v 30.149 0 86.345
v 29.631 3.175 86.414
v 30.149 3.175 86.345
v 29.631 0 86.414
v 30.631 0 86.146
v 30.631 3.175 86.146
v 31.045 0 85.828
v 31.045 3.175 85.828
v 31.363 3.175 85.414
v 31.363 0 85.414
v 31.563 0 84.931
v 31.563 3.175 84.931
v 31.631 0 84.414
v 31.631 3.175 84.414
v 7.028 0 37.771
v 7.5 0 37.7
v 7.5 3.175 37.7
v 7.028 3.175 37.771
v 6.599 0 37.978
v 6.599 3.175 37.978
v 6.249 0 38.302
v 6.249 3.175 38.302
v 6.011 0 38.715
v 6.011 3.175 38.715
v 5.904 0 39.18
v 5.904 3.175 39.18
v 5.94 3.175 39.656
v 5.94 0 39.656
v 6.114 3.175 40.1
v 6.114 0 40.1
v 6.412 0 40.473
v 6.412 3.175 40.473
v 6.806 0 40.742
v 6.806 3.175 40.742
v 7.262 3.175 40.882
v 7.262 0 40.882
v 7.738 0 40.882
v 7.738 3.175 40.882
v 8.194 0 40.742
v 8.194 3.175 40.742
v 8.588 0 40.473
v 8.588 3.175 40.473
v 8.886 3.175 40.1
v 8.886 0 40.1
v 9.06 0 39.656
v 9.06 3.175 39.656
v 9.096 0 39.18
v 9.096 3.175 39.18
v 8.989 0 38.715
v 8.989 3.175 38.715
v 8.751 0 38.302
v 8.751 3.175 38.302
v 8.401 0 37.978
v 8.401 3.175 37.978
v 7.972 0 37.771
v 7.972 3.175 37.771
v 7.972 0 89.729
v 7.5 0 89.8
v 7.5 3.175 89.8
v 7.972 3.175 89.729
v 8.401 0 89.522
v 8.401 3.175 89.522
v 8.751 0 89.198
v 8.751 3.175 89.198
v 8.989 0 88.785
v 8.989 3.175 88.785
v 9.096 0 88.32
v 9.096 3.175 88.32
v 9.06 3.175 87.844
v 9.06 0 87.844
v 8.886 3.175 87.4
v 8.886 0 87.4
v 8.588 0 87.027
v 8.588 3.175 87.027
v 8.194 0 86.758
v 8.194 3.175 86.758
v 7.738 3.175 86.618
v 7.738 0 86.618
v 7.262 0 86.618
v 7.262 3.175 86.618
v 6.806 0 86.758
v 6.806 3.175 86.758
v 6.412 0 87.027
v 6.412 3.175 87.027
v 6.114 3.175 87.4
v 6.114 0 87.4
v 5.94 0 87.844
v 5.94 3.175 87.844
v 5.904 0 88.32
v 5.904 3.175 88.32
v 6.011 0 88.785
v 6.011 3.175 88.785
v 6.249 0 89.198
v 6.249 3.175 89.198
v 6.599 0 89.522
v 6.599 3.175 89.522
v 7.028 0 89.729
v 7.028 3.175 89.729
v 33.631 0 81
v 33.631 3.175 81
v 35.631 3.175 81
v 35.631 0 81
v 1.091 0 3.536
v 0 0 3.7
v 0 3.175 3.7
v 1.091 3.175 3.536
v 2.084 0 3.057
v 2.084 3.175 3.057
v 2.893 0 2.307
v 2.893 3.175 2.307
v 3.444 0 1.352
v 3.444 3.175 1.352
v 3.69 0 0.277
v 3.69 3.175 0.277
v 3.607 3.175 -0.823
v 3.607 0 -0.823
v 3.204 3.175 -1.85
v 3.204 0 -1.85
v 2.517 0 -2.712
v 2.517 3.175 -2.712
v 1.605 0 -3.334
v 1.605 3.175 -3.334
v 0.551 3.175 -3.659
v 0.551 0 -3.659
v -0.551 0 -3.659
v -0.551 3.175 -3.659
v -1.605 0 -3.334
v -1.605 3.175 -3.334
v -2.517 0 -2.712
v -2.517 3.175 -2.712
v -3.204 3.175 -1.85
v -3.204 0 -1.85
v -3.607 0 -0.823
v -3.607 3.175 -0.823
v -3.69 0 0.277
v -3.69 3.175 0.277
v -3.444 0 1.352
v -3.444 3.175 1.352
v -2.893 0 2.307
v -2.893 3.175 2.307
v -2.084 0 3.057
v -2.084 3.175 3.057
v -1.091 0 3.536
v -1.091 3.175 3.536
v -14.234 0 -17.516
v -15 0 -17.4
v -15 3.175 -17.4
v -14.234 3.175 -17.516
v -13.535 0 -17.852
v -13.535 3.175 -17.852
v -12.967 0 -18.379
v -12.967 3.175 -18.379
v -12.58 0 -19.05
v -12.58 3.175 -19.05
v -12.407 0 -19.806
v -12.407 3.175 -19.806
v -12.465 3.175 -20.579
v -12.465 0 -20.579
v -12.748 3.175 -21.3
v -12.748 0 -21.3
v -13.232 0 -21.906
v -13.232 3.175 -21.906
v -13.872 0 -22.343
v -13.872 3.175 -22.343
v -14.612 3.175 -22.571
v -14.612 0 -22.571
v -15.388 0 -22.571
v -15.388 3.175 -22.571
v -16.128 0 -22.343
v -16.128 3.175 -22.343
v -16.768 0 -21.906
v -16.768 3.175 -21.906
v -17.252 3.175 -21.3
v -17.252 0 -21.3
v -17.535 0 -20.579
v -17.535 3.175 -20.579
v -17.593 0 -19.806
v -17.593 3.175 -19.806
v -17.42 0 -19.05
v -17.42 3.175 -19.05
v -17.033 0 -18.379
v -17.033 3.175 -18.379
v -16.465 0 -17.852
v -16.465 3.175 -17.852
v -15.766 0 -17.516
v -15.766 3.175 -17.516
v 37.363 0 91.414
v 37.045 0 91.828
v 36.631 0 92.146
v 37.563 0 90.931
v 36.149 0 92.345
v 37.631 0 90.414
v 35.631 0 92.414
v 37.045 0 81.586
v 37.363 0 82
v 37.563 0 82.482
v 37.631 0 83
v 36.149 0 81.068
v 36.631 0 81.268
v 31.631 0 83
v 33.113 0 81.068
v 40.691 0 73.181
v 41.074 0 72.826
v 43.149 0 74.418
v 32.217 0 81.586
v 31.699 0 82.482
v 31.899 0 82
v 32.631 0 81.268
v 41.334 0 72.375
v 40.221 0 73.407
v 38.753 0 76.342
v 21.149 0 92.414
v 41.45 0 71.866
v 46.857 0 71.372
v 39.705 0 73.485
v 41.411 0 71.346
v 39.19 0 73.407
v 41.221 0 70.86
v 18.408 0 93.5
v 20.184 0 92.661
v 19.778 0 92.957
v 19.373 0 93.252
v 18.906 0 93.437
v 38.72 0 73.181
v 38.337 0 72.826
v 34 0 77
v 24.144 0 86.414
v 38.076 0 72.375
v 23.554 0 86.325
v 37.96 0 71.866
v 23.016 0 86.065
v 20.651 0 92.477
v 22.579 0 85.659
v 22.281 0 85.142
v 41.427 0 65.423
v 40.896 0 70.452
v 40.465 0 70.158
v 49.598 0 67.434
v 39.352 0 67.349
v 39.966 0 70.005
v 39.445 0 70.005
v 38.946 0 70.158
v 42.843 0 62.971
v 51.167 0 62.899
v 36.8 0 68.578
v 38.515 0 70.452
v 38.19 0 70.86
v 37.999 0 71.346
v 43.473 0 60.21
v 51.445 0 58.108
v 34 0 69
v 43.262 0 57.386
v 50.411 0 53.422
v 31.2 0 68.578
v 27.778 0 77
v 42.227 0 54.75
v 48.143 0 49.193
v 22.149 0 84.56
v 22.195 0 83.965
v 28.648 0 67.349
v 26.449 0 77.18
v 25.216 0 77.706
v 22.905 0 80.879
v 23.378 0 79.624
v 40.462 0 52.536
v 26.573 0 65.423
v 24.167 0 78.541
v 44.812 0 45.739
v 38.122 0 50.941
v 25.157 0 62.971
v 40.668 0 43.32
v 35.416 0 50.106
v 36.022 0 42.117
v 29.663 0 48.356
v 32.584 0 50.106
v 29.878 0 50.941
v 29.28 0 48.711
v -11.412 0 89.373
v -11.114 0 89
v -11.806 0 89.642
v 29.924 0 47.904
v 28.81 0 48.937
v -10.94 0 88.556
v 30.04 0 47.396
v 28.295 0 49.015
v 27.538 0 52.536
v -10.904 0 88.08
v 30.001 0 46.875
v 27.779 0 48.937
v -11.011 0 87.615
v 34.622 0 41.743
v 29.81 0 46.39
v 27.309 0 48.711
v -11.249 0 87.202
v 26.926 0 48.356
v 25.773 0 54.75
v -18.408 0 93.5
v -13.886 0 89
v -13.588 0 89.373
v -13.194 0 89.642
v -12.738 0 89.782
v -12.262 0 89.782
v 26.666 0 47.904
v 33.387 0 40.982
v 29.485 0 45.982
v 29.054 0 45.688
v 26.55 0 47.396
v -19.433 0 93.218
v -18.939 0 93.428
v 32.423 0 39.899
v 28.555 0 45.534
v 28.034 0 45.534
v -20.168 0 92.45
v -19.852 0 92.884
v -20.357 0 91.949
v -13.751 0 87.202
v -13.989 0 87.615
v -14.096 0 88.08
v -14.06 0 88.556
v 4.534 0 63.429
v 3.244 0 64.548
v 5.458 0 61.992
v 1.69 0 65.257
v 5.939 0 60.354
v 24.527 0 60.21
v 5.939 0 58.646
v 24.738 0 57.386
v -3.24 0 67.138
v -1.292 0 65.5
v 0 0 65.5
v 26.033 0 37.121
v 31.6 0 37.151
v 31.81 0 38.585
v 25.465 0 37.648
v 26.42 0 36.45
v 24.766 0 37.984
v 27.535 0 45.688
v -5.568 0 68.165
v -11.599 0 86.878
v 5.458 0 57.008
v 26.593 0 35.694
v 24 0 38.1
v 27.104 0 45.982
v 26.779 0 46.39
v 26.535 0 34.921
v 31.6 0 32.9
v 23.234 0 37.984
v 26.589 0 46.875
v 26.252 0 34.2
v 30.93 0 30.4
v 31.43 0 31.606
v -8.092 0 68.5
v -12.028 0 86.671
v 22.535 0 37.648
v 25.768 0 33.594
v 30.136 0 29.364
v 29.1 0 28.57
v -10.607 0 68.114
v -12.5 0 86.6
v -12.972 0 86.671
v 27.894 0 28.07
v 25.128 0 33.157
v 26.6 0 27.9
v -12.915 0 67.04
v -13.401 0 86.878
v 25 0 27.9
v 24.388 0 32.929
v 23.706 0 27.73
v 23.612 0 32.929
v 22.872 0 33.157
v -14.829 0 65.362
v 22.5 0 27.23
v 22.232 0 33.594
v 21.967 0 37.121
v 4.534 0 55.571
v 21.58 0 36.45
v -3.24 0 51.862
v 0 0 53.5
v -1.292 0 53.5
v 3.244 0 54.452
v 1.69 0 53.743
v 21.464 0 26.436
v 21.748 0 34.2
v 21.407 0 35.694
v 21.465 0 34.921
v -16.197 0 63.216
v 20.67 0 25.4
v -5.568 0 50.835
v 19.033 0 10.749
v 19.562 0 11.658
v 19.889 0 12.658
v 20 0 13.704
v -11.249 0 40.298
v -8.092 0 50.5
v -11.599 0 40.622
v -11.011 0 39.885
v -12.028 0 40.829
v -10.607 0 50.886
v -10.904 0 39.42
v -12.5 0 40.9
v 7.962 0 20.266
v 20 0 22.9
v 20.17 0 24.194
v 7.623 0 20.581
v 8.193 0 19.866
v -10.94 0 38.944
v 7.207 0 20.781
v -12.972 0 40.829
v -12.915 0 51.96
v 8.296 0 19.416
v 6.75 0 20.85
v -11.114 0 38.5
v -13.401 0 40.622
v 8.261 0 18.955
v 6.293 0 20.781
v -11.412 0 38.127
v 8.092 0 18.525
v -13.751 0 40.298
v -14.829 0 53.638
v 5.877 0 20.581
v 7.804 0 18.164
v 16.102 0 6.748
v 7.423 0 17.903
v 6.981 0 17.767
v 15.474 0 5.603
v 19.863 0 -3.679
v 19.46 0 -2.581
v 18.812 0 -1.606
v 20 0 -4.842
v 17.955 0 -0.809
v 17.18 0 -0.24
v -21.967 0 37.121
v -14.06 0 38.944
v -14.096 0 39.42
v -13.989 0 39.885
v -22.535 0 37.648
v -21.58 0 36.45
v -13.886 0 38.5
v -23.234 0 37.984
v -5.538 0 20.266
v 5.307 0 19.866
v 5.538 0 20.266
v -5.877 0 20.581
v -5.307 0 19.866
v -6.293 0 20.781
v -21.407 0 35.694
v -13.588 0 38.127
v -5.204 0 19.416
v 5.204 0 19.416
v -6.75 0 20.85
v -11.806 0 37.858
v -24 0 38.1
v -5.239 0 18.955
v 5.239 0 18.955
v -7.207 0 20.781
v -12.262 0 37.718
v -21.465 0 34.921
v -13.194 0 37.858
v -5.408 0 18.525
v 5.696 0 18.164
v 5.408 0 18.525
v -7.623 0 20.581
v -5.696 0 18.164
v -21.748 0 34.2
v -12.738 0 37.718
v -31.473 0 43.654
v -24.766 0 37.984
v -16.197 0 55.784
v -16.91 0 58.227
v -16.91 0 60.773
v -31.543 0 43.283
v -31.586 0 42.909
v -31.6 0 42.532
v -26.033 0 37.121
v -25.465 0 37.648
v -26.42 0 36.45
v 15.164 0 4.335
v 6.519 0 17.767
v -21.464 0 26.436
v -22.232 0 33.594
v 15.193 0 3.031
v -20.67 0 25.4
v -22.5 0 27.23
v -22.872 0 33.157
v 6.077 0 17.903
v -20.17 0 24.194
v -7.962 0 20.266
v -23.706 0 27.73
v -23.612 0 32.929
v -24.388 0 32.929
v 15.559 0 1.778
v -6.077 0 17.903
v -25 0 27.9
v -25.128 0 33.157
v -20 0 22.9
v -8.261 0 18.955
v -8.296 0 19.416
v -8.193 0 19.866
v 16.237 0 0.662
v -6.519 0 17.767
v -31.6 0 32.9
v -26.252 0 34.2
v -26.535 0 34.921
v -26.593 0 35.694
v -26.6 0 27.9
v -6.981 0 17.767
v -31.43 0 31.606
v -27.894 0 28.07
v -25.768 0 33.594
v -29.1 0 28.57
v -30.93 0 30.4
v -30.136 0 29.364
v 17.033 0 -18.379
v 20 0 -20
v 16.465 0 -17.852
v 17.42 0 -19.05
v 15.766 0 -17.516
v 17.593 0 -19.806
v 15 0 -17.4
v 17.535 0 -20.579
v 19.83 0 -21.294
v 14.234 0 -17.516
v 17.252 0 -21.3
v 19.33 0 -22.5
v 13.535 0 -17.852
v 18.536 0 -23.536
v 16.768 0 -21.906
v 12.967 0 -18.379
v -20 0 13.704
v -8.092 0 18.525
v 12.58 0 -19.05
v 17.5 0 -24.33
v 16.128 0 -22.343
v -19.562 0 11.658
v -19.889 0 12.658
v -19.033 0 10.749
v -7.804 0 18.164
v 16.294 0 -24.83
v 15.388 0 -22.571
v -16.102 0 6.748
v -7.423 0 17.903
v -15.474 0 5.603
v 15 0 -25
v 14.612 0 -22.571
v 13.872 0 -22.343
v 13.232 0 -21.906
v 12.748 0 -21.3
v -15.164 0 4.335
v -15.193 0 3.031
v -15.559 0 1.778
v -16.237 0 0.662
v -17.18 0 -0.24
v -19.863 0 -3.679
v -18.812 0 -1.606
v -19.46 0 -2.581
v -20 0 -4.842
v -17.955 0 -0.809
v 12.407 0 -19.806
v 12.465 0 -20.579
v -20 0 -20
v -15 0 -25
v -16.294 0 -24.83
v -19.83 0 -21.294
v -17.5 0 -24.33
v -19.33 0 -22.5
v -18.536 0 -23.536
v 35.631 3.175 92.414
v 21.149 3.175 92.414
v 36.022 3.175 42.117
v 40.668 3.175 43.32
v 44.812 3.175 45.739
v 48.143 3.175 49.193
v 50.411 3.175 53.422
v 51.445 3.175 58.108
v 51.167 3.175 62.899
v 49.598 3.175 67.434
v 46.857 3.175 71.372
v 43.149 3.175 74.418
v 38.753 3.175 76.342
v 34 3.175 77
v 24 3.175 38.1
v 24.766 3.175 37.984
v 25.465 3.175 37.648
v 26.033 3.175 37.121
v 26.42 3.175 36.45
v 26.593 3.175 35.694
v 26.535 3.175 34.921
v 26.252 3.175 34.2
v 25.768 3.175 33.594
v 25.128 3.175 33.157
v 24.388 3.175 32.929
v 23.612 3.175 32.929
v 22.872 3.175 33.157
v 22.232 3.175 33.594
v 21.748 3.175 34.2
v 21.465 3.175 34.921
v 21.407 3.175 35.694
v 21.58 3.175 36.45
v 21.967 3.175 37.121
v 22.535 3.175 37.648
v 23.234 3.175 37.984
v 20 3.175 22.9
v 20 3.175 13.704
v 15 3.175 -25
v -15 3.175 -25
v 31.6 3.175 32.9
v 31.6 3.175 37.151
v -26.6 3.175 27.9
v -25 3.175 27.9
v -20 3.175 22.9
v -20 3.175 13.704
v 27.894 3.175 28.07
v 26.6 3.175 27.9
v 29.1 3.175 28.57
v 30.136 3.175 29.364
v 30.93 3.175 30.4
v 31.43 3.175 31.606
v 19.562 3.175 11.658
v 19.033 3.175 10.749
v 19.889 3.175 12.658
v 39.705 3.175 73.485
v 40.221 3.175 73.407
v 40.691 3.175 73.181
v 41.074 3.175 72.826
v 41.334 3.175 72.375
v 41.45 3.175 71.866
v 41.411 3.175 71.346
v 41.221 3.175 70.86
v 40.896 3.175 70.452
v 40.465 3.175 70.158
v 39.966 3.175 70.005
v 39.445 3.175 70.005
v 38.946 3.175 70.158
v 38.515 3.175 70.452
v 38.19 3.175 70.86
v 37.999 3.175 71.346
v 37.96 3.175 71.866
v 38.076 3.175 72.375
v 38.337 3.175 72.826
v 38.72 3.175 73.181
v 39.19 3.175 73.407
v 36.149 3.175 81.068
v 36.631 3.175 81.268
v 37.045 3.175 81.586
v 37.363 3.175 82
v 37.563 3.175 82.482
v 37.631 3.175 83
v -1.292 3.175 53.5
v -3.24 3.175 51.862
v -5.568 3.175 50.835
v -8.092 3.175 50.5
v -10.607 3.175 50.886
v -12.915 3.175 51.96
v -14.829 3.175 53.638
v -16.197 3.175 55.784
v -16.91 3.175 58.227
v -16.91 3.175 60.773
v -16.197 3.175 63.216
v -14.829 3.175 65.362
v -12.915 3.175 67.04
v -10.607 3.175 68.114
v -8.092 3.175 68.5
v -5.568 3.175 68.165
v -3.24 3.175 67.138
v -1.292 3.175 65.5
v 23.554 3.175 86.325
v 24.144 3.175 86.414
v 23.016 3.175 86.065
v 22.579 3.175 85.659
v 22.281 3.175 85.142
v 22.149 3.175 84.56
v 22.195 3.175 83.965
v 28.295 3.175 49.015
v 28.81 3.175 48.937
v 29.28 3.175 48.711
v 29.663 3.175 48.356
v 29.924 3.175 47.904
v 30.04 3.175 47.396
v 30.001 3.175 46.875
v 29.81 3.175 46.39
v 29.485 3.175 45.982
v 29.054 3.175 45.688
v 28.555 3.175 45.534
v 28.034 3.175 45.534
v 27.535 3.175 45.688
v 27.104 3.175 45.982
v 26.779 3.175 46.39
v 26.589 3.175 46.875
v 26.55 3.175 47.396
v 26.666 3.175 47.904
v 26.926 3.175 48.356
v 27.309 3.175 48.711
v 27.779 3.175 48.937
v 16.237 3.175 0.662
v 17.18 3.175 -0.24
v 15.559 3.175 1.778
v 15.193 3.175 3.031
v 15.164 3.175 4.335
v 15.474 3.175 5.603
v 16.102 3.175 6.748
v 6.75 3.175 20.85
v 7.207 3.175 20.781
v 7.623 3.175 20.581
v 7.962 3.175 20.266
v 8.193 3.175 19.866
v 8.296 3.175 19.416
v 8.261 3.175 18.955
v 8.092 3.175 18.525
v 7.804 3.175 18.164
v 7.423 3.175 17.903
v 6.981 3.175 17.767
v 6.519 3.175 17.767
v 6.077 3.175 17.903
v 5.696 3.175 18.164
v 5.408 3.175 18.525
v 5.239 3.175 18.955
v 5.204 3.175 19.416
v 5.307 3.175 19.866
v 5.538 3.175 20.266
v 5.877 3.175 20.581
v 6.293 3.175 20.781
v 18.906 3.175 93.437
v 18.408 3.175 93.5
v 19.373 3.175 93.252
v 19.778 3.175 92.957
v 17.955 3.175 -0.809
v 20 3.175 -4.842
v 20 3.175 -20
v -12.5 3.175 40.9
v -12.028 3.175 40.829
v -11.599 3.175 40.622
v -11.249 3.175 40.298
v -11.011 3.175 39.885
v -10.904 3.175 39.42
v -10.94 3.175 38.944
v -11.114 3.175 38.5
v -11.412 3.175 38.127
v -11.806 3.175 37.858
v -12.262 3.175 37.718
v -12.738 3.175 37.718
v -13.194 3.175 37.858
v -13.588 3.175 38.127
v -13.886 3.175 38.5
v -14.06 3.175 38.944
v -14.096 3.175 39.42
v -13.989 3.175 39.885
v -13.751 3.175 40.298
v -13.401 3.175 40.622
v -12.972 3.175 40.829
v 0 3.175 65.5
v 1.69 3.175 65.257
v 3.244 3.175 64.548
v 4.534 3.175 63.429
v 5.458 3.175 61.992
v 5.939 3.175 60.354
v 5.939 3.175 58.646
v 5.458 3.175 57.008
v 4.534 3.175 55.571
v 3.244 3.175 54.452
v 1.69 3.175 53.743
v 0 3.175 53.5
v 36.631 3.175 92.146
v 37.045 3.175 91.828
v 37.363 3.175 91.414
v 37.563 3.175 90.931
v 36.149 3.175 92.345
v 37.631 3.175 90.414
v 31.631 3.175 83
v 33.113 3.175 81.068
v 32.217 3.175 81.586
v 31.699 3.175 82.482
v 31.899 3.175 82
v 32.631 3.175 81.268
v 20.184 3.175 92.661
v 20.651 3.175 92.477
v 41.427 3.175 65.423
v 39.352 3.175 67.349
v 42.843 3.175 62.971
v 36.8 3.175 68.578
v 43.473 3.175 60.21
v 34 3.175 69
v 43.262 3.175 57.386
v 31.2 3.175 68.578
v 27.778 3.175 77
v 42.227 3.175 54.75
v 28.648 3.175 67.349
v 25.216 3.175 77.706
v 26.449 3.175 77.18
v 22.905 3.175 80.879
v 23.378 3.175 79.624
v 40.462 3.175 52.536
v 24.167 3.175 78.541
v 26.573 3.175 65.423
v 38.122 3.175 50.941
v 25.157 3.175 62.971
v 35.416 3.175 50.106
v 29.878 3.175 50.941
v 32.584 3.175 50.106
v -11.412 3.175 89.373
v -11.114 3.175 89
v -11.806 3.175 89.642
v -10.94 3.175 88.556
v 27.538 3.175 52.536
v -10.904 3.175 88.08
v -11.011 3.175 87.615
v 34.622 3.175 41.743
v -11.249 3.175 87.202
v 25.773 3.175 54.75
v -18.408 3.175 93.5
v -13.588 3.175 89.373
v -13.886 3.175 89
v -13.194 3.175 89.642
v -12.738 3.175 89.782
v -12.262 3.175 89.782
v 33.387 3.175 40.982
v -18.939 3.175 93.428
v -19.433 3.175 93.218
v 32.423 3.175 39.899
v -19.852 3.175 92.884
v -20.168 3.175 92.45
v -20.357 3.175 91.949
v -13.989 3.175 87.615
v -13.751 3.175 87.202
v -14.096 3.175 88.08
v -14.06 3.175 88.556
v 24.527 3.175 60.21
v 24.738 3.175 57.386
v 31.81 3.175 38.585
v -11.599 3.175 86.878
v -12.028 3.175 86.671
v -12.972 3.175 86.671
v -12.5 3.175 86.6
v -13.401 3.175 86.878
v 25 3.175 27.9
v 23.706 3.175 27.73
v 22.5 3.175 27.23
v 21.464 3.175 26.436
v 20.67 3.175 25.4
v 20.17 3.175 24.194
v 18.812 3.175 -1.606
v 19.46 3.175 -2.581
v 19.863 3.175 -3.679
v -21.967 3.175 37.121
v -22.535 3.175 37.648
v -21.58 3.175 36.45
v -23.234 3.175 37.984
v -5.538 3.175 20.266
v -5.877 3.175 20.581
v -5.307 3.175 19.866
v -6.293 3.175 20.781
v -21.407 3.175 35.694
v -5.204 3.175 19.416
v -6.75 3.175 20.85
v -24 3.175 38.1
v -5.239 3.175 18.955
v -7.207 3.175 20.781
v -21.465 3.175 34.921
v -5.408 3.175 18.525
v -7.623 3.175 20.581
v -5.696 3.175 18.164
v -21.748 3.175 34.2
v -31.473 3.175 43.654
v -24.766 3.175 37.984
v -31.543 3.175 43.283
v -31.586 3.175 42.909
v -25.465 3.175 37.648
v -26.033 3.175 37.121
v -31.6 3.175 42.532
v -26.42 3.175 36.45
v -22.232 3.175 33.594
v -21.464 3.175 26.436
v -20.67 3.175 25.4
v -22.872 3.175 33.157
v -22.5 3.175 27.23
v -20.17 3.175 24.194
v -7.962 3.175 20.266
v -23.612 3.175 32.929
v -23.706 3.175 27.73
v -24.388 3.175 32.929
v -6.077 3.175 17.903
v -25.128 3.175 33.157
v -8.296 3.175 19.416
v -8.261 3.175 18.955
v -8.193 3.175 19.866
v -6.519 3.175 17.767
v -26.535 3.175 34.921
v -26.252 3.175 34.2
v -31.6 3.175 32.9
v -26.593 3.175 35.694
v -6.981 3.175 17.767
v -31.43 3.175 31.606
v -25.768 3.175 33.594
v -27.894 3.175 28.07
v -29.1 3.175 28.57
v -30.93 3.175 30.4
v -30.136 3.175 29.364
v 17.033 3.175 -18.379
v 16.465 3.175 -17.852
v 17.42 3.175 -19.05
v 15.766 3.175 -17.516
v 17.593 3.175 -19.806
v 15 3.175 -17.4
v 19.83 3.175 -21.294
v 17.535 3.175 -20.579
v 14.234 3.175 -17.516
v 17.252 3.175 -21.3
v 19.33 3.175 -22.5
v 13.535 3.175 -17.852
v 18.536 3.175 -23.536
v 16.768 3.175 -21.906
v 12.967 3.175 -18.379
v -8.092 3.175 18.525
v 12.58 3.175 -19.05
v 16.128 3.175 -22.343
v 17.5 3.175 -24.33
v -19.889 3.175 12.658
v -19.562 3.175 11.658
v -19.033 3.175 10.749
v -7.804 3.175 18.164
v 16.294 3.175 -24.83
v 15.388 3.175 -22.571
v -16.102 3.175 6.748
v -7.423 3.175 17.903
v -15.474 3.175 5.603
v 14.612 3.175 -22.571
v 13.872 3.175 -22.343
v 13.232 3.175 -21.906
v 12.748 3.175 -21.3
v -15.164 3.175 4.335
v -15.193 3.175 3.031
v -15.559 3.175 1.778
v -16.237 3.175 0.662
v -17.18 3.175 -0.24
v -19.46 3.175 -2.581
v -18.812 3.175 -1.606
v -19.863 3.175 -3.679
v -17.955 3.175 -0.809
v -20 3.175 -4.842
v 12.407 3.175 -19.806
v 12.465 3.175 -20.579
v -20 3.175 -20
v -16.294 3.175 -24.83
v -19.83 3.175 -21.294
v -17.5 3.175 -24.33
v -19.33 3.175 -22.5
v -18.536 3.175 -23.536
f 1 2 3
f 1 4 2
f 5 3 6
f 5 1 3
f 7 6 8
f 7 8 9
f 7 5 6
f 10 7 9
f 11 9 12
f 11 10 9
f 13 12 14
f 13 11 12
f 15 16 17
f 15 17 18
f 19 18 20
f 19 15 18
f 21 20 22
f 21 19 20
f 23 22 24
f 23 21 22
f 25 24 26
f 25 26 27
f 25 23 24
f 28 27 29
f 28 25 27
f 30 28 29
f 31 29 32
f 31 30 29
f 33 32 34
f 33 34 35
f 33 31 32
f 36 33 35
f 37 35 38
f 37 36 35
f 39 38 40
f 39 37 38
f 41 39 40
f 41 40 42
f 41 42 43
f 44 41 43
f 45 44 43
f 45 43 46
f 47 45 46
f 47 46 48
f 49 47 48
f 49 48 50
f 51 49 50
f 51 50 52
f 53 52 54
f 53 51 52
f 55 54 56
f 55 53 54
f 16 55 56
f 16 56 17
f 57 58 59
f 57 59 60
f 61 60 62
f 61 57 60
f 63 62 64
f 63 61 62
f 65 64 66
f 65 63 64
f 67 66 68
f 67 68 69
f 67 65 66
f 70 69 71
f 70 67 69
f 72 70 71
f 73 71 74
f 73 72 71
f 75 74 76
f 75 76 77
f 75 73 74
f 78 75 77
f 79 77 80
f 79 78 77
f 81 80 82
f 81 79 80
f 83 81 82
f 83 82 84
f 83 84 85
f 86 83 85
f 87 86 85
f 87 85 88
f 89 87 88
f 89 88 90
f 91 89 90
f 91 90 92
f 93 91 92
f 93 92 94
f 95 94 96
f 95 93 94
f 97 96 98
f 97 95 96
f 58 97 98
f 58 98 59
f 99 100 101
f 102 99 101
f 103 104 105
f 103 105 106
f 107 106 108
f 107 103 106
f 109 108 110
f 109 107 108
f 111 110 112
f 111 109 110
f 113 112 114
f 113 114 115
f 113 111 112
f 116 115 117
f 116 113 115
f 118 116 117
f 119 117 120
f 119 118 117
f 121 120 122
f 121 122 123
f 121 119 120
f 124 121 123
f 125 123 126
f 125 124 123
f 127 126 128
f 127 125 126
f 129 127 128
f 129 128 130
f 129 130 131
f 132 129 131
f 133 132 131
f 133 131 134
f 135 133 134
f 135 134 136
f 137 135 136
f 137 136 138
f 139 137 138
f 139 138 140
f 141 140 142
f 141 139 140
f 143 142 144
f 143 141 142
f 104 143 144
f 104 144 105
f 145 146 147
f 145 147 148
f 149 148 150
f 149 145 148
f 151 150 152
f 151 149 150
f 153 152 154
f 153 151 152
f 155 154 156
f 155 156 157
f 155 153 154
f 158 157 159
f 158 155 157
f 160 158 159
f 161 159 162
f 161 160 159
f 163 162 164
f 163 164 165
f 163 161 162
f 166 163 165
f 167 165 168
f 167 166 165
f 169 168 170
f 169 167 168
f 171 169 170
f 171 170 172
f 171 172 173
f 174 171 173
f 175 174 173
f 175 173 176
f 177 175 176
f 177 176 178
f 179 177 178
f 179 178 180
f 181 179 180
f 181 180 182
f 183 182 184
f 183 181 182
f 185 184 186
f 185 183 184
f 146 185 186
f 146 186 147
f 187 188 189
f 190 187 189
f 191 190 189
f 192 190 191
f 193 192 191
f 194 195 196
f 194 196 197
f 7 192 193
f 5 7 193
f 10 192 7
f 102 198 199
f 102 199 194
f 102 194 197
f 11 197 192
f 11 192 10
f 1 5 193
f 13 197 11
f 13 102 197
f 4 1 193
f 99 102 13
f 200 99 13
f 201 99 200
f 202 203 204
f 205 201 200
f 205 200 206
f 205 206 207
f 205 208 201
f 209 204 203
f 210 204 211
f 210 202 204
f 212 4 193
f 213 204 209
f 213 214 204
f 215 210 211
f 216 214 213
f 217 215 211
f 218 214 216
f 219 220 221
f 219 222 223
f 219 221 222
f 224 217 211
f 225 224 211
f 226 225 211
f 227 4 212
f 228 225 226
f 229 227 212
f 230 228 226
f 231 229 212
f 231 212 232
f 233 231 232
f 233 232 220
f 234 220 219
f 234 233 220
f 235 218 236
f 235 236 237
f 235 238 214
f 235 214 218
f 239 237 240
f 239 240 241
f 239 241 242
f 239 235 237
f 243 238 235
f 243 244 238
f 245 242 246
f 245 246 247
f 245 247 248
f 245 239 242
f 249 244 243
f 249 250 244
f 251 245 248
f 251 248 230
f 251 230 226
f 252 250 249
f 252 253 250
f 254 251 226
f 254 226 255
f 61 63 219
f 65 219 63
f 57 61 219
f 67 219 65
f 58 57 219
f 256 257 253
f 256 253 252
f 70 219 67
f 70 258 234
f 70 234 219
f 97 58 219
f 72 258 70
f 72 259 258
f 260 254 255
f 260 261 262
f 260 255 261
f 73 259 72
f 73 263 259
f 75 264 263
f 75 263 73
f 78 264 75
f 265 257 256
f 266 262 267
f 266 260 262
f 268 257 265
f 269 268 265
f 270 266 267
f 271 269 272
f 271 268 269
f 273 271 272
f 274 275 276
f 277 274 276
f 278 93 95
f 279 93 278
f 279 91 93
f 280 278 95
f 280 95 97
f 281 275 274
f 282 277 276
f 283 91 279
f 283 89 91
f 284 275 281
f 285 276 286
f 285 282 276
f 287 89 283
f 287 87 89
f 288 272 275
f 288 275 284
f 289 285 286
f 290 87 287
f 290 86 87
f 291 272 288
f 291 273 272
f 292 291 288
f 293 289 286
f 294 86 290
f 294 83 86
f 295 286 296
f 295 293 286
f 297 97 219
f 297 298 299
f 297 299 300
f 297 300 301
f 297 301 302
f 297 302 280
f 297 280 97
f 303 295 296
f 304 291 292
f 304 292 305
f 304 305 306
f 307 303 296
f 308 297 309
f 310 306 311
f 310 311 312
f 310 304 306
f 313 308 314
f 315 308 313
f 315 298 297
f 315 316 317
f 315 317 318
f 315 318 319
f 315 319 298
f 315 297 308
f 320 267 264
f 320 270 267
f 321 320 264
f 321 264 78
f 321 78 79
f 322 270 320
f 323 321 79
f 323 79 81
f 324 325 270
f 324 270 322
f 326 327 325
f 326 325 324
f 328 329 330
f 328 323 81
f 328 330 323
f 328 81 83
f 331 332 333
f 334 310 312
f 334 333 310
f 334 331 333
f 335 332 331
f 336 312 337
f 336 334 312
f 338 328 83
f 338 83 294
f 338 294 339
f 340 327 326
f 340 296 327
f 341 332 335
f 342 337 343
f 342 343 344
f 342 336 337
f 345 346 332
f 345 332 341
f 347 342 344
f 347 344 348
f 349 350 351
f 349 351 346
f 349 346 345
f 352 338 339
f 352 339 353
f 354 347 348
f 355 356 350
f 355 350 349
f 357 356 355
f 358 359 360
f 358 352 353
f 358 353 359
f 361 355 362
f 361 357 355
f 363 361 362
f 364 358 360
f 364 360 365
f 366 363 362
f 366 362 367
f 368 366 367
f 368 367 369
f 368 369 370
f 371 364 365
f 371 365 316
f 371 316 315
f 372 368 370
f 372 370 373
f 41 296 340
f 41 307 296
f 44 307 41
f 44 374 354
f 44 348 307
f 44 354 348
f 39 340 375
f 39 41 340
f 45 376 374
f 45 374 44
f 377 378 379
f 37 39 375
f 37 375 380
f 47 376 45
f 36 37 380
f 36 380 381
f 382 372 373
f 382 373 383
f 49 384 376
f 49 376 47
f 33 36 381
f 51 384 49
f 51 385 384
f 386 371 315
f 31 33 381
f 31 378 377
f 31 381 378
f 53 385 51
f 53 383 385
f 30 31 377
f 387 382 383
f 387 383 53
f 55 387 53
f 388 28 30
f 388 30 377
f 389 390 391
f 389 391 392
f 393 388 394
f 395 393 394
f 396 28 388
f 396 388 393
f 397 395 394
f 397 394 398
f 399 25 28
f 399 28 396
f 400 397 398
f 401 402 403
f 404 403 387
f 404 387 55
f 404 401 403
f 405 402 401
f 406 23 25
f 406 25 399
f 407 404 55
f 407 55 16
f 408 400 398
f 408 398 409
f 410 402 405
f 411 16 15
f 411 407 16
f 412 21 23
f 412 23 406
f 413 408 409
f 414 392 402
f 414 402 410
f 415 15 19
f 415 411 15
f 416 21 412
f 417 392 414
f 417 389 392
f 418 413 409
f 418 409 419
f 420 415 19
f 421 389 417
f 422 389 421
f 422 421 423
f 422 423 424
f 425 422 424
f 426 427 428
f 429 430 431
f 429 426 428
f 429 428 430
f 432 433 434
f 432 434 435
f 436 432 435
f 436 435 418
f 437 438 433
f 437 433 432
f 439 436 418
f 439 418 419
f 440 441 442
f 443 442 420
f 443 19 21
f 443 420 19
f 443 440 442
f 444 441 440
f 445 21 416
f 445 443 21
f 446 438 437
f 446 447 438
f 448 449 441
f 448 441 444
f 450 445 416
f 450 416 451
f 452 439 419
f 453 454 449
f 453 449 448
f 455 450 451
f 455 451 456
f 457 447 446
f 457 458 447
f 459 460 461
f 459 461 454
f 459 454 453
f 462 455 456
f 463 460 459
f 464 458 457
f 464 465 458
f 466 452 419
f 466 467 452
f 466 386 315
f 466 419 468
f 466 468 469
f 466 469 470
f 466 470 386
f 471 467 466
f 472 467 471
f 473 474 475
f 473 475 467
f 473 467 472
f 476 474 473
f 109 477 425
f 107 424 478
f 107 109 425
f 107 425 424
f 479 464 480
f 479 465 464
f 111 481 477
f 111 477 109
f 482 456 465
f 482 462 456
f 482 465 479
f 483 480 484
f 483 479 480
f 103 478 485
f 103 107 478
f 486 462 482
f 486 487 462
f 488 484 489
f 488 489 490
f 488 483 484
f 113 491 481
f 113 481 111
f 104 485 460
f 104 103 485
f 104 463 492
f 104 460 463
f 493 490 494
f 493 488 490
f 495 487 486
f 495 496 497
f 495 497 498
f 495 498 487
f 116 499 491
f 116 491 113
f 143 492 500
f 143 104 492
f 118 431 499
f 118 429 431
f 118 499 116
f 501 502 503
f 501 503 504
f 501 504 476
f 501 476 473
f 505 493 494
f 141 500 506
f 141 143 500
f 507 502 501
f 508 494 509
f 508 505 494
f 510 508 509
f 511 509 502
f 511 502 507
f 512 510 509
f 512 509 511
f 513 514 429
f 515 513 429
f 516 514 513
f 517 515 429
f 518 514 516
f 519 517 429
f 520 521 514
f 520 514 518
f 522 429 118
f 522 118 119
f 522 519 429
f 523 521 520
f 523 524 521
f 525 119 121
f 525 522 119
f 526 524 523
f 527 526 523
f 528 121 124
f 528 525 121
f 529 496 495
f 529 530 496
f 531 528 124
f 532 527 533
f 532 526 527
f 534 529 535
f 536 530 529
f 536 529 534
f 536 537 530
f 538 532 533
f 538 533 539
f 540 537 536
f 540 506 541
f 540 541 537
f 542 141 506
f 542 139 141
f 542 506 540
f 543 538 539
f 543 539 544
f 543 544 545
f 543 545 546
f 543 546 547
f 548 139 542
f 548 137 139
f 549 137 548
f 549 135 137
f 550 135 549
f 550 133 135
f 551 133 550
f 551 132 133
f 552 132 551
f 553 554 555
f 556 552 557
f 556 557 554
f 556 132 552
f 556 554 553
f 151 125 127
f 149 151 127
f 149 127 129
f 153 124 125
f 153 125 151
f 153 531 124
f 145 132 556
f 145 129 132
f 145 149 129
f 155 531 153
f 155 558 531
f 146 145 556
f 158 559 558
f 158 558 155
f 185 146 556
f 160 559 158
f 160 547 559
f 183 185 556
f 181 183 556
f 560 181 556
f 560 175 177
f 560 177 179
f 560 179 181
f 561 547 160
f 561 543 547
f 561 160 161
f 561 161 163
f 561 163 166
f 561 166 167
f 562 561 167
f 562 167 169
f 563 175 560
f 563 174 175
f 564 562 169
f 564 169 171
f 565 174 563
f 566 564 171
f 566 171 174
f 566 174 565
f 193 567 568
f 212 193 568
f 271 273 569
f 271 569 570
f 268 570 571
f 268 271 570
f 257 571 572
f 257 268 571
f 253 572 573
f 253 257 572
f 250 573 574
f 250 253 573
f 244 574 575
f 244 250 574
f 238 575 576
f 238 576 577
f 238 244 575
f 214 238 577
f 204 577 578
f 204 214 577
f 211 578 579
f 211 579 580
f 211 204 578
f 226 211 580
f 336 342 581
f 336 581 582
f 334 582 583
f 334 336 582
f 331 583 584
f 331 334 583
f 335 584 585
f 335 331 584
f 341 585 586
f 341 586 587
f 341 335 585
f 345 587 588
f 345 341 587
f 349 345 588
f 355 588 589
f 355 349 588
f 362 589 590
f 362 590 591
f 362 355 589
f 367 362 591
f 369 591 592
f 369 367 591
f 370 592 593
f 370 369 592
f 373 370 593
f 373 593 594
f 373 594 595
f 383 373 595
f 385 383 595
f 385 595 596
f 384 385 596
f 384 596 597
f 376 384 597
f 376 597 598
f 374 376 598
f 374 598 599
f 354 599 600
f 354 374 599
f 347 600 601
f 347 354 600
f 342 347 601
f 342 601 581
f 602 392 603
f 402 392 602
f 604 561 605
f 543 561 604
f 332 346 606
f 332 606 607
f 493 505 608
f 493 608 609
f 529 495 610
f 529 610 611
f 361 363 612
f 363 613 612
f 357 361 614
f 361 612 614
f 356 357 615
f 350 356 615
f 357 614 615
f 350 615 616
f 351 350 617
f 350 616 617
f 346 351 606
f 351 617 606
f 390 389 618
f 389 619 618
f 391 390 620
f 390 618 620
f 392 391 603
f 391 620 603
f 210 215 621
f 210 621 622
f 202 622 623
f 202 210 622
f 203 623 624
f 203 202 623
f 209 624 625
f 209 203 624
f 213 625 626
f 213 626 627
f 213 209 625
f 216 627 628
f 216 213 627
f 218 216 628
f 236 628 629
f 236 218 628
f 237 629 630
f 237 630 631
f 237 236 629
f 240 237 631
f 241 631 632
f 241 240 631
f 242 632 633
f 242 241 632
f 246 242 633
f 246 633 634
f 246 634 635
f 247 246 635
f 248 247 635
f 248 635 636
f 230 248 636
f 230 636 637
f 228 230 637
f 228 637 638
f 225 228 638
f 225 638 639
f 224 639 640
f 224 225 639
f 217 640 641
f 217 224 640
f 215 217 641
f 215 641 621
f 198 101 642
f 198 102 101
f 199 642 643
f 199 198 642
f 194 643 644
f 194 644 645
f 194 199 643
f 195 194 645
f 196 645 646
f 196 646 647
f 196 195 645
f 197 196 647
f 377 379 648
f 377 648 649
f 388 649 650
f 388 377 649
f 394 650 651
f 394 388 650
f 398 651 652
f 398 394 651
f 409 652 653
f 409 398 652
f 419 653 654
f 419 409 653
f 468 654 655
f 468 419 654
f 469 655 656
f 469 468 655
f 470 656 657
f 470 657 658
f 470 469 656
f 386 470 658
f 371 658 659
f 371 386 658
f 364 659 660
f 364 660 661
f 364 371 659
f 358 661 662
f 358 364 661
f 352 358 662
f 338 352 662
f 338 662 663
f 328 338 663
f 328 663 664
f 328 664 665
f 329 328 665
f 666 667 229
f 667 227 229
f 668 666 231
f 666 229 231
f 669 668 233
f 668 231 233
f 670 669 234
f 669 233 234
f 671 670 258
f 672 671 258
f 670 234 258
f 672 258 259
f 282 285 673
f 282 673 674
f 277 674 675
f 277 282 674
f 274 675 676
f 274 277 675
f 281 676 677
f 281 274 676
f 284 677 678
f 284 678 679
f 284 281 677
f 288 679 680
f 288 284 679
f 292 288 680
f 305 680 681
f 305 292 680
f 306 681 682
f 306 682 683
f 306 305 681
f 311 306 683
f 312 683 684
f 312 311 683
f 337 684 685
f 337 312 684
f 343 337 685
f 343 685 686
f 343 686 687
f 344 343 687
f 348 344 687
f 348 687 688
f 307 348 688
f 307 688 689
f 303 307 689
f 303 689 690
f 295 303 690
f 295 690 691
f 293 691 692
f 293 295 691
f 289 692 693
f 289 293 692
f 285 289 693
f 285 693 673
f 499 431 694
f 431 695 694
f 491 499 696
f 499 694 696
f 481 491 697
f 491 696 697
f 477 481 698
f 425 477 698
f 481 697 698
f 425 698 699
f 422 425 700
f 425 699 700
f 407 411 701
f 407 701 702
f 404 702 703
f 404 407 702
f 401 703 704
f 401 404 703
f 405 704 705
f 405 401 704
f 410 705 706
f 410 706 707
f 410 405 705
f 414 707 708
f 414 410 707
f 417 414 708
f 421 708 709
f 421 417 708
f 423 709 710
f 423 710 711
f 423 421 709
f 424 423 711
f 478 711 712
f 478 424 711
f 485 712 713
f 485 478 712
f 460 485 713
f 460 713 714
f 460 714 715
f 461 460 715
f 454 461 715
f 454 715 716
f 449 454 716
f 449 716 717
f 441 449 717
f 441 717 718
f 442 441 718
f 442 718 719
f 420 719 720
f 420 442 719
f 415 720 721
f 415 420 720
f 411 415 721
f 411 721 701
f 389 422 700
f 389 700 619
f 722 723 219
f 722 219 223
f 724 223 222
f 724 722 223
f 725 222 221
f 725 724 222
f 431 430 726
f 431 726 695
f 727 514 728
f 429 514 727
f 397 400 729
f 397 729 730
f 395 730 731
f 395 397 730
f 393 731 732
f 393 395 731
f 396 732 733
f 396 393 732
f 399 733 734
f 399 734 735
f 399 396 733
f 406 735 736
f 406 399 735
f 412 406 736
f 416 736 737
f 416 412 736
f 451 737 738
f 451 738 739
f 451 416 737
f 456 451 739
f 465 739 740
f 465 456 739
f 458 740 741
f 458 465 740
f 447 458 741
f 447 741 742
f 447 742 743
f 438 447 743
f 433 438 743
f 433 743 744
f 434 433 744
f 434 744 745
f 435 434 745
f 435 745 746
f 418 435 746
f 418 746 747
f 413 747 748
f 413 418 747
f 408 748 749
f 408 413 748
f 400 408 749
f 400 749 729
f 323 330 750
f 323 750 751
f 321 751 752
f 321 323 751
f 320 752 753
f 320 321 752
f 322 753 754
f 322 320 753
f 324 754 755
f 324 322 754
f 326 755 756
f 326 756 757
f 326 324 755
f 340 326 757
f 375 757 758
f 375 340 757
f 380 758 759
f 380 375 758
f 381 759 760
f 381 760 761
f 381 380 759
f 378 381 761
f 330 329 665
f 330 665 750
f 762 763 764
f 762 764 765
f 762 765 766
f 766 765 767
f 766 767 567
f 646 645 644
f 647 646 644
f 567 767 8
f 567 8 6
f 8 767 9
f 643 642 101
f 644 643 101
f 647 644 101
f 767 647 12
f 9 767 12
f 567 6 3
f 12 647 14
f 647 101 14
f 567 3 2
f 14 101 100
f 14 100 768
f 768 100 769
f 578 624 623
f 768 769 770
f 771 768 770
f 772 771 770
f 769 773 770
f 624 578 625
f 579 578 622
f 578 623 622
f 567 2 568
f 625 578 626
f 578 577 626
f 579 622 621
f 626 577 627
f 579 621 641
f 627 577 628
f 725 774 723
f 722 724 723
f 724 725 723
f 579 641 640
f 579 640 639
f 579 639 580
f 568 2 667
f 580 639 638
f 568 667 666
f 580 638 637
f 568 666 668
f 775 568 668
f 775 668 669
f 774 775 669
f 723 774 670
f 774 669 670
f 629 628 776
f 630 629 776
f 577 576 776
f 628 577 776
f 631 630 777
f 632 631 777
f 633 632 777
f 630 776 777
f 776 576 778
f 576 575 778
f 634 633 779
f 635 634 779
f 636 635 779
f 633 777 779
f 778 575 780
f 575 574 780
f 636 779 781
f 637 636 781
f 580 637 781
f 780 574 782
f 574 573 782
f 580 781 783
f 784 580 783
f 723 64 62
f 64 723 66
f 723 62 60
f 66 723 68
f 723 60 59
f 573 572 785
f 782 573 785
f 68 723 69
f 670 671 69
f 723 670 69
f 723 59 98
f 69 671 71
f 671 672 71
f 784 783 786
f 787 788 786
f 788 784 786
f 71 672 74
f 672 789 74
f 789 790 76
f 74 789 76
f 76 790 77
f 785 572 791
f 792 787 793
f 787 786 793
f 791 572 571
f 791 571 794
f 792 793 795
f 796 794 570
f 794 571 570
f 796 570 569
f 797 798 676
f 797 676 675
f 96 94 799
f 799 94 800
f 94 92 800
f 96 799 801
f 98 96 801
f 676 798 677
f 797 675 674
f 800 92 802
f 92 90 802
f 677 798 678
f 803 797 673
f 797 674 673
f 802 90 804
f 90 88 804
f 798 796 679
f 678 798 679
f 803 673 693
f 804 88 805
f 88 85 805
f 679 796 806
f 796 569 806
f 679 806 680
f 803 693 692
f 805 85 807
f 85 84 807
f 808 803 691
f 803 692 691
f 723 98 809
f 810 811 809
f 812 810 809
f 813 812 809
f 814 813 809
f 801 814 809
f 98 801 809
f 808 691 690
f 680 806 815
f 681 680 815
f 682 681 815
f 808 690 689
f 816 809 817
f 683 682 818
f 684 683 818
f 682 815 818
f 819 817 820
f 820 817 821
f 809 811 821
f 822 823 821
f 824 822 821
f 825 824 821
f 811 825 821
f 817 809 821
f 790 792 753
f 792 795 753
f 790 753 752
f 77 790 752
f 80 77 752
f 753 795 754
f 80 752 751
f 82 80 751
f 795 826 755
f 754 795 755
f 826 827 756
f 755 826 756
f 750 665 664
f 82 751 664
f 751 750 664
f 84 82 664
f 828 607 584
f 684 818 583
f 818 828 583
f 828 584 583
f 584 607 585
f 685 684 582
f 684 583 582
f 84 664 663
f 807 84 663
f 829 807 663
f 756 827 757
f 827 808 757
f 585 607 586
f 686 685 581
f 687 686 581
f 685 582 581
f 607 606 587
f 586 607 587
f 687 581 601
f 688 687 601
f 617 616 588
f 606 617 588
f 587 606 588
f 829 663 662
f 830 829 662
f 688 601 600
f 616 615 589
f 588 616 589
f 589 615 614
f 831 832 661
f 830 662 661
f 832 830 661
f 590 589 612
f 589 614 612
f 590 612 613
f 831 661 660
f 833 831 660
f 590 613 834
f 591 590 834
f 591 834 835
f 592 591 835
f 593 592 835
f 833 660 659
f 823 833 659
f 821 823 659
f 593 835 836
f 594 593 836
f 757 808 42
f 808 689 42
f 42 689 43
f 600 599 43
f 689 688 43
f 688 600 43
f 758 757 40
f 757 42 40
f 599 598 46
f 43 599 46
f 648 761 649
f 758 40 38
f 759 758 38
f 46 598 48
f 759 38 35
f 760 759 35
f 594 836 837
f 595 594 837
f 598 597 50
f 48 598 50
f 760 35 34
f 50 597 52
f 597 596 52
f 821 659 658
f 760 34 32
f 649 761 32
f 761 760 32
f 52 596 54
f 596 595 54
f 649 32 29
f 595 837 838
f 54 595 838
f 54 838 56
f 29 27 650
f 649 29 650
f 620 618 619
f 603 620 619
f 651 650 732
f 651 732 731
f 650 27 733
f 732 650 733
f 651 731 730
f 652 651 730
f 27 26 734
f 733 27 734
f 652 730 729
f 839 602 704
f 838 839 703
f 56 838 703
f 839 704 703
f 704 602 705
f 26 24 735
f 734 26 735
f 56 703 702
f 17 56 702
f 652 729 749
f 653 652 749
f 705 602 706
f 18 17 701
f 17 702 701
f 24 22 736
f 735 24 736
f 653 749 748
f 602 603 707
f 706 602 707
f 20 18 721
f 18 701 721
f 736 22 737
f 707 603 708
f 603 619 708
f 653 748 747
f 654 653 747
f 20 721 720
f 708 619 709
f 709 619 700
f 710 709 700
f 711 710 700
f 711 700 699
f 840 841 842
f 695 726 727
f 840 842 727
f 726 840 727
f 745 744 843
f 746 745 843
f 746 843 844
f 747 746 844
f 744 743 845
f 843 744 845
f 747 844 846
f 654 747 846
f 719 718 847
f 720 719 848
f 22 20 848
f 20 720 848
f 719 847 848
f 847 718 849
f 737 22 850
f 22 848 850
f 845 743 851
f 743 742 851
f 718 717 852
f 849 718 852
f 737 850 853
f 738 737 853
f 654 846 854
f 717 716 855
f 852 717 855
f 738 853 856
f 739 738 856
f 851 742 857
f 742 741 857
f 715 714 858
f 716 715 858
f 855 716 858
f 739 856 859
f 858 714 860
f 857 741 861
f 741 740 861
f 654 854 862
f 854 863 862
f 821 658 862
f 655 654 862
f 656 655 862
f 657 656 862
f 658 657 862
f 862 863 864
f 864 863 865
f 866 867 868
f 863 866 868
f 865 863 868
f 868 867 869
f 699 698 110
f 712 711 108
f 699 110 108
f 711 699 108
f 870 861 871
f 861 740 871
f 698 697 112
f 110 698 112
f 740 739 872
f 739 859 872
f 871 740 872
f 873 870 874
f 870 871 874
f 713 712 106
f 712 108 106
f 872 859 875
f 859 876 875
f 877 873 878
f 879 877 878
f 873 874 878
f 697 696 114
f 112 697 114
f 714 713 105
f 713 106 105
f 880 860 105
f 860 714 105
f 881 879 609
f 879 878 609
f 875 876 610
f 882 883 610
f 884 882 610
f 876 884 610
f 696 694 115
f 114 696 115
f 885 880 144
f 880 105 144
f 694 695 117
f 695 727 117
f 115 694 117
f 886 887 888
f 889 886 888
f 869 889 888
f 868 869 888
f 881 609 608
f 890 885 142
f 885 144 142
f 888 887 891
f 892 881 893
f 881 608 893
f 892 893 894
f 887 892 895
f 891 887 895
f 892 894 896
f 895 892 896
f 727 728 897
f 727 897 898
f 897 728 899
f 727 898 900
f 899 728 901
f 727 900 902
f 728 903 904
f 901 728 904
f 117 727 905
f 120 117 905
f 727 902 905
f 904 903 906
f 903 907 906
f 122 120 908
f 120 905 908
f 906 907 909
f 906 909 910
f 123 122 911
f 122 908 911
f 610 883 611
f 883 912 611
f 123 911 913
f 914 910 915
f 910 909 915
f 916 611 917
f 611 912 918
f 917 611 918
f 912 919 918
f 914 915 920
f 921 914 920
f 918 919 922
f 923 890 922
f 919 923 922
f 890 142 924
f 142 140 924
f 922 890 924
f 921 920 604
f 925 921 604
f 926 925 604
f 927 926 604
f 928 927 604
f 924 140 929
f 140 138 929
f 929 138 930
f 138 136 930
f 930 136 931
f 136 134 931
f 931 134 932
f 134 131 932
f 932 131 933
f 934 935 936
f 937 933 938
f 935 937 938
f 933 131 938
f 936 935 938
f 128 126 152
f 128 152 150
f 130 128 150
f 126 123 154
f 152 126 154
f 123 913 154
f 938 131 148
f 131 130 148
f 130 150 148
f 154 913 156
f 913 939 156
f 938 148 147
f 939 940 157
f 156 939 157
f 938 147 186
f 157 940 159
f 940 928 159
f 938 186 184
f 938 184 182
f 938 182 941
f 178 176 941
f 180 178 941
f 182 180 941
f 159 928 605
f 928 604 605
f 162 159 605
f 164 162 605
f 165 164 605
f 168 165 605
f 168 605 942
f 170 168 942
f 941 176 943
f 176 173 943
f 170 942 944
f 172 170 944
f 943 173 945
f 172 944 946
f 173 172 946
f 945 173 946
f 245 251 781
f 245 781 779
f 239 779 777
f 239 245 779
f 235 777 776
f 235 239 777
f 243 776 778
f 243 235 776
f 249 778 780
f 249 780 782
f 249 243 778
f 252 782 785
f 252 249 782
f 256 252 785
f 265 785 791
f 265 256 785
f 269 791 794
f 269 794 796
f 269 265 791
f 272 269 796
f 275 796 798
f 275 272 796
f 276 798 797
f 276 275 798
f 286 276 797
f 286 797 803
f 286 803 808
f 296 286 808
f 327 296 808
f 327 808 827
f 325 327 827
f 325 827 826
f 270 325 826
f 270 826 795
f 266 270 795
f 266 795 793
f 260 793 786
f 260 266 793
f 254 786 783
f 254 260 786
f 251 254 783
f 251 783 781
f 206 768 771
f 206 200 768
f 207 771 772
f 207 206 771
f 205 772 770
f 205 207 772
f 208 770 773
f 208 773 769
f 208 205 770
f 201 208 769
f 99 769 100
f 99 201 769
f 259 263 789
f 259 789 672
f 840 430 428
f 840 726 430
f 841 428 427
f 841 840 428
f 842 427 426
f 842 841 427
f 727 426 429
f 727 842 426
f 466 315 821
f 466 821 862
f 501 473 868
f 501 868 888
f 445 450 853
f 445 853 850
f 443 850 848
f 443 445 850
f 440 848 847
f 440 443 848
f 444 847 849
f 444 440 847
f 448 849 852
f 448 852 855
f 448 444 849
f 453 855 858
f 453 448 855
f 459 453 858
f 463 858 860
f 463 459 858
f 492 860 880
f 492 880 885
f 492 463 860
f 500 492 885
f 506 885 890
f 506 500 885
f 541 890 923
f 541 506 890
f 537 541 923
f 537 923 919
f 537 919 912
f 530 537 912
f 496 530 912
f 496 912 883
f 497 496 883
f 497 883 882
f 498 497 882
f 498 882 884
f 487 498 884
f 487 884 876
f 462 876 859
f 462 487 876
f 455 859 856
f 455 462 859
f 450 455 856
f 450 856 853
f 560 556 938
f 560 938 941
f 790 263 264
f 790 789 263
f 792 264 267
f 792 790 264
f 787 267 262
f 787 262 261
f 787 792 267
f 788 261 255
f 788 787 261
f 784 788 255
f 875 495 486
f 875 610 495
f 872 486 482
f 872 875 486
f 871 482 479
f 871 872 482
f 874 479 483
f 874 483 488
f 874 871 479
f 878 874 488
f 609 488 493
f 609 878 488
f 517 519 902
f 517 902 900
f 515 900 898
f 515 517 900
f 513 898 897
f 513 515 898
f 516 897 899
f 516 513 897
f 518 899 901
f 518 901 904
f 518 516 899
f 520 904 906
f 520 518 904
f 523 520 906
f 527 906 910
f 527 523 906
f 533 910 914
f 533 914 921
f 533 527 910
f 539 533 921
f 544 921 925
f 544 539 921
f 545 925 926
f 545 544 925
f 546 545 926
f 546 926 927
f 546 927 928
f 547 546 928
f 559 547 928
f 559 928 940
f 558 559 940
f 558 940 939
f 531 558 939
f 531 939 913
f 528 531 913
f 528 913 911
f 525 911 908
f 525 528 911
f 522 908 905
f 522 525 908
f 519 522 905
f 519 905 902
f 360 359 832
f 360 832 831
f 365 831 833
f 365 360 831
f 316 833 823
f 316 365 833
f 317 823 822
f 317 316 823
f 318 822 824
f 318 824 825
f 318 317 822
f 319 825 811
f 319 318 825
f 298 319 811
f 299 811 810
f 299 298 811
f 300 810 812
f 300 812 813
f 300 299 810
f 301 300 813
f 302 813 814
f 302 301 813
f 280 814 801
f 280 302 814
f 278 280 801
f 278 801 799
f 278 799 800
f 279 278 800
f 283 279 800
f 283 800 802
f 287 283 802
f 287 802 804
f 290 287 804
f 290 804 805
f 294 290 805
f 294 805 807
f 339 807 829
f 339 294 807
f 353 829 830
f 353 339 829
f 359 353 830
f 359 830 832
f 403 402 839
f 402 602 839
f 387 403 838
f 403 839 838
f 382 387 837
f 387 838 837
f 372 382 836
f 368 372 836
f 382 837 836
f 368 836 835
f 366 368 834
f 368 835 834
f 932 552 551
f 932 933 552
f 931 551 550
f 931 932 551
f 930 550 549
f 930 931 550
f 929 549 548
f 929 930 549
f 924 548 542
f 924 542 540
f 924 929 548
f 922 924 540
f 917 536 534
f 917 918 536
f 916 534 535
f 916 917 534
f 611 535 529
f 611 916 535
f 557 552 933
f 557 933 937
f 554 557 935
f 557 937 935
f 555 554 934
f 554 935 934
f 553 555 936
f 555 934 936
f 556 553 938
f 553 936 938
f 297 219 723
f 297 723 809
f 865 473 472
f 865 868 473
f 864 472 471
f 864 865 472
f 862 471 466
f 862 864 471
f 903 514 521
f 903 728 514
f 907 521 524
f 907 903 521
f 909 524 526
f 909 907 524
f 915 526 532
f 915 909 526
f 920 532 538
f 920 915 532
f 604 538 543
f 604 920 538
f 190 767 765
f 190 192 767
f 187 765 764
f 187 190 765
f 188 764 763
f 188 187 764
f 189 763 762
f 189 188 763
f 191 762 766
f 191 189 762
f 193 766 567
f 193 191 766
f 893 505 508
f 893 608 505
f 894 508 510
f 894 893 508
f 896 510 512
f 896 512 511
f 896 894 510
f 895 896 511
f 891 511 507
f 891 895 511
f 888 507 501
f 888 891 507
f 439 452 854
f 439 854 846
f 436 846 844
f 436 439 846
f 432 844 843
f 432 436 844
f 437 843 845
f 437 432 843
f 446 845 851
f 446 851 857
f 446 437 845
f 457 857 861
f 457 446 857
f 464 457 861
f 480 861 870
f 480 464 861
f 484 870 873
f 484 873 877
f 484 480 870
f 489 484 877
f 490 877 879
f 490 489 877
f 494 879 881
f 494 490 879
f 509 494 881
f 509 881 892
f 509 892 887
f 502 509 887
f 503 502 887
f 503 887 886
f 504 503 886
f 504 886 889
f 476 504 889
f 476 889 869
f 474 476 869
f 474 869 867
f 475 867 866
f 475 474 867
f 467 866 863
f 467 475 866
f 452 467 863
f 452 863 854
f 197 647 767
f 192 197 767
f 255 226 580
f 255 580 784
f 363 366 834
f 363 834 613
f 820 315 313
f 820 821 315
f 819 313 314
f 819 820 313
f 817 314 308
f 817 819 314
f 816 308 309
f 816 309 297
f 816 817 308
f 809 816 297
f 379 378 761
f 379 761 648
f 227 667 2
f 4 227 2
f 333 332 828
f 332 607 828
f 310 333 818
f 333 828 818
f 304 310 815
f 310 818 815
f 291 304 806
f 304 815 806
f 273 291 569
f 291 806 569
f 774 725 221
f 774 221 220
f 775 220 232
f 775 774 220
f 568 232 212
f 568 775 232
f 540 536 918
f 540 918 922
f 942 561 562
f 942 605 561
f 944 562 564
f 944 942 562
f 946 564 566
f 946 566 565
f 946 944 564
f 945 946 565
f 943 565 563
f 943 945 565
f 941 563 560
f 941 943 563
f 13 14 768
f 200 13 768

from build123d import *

# Parameters (mm, degrees)
SKETCH1_R           = 9.5
SKETCH1_R_2         = 1.75
SKETCH1_R_3         = 2.6
SKETCH1_R_4         = 3.7
SKETCH1_R_5         = 1.6
SKETCH1_R_6         = 1.55
BOSS_EXTRUDE1_DEPTH = 3.175
FILLET1_R           = 5
FILLET2_R           = 2
BOSS_EXTRUDE2_DEPTH = 3.175
FILLET3_R           = 2
FILLET4_R           = 2
BOSS_EXTRUDE3_START = -3.175
SKETCH4_R           = 2.6
BOSS_EXTRUDE3_DEPTH = 3.175
FILLET5_R           = 5


with BuildPart() as part:
    # Sketch1 → Boss-Extrude1 (new body)
    with BuildSketch(Plane(origin=(0, 0, 0), x_dir=(1, 0, 0), z_dir=(0, 1, 0))):
        with BuildLine():
            Line((-20, -12.068401935), (-7.259795863, 5.319338683))
            ThreePointArc((-7.259795863, 5.319338683), (0, 9), (7.259795863, 5.319338683))
            Line((7.259795863, 5.319338683), (20, -12.068401935))
            Line((20, -12.068401935), (20, -27.9))
            Line((20, -27.9), (31.6, -27.9))
            Line((31.6, -27.9), (31.6, -42.165352614))
            ThreePointArc((31.6, -42.165352614), (51.458612907, -58.2971553), (34, -77))
            Line((34, -77), (23.797619048, -77))
            Line((23.797619048, -77), (20, -93.5))
            Line((20, -93.5), (-20, -93.5))
            Line((-20, -93.5), (-31.6, -43.1))
            Line((-31.6, -43.1), (-31.6, -27.9))
            Line((-31.6, -27.9), (-20, -27.9))
            Line((-20, -27.9), (-20, -12.068401935))
        make_face()
        with Locations(Location((34, -59.5, 0), (0, 0, 270))):
            Circle(SKETCH1_R, mode=Mode.SUBTRACT)
        with Locations(Location((28.294653467, -47.264844875, 0), (0, 0, 270))):
            Circle(SKETCH1_R_2, mode=Mode.SUBTRACT)
        with Locations(Location((39.705346533, -71.735155125, 0), (0, 0, 270))):
            Circle(SKETCH1_R_2, mode=Mode.SUBTRACT)
        with Locations(Location((-24, -35.5, 0), (0, 0, 270))):
            Circle(SKETCH1_R_3, mode=Mode.SUBTRACT)
        with Locations(Location((24, -35.5, 0), (0, 0, 270))):
            Circle(SKETCH1_R_3, mode=Mode.SUBTRACT)
        with Locations(Location((0, 0, 0), (0, 0, 270))):
            Circle(SKETCH1_R_4, mode=Mode.SUBTRACT)
        with Locations(Location((-12.5, -39.3, 0), (0, 0, 270))):
            Circle(SKETCH1_R_5, mode=Mode.SUBTRACT)
        with Locations(Location((-6.75, -19.3, 0), (0, 0, 270))):
            Circle(SKETCH1_R_6, mode=Mode.SUBTRACT)
        with Locations(Location((6.75, -19.3, 0), (0, 0, 270))):
            Circle(SKETCH1_R_6, mode=Mode.SUBTRACT)
        with Locations(Location((7.5, -39.3, 0), (0, 0, 90))):
            Circle(SKETCH1_R_5, mode=Mode.SUBTRACT)
        with Locations(Location((7.5, -88.2, 0), (0, 0, 270))):
            Circle(SKETCH1_R_5, mode=Mode.SUBTRACT)
        with Locations(Location((-12.5, -88.2, 0), (0, 0, 90))):
            Circle(SKETCH1_R_5, mode=Mode.SUBTRACT)
        with BuildLine():
            Line((0, -53.5), (-1.291796068, -53.5))
            ThreePointArc((-1.291796068, -53.5), (-17, -59.5), (-1.291796068, -65.5))
            Line((-1.291796068, -65.5), (0, -65.5))
            ThreePointArc((0, -65.5), (6, -59.5), (0, -53.5))
        make_face(mode=Mode.SUBTRACT)
    extrude(amount=BOSS_EXTRUDE1_DEPTH)

    # Fillet1
    fillet1_edges = [part.edges().sort_by_distance(p)[0] for p in [
        (-31.6, 1.5875, 43.1),
        (-31.6, 1.5875, 27.9),
        (-20, 1.5875, 27.9),
        (-20, 1.5875, 12.068401935),
        (20, 1.5875, 12.068401935),
        (20, 1.5875, 27.9),
        (31.6, 1.5875, 27.9),
        (31.6, 1.5875, 42.165352614),
        (23.797619048, 1.5875, 77),
    ]]
    fillet(fillet1_edges, radius=FILLET1_R)

    # Fillet2
    fillet2_edges = [part.edges().sort_by_distance(p)[0] for p in [
        (-20, 1.5875, 93.5),
        (20, 1.5875, 93.5),
    ]]
    fillet(fillet2_edges, radius=FILLET2_R)

    # Sketch3 → Boss-Extrude2 (add)
    with BuildSketch(Plane(origin=(0, 3.175, 0), x_dir=(1, 0, 0), z_dir=(0, 1, 0))):
        Polygon((21.631006471, -86.413558093), (31.631006471, -86.413558093), (31.631006471, -81), (37.631006471, -81), (37.631006471, -92.413558093), (20.25005409, -92.413558093), align=None)
    extrude(amount=-BOSS_EXTRUDE2_DEPTH)

    # Fillet3
    fillet3_edges = [part.edges().sort_by_distance(p)[0] for p in [
        (21.631006471, 1.5875, 86.413558093),
        (31.631006471, 1.5875, 86.413558093),
        (31.631006471, 1.5875, 81),
        (37.631006471, 1.5875, 81),
        (37.631006471, 1.5875, 92.413558093),
    ]]
    fillet(fillet3_edges, radius=FILLET3_R)

    # Fillet4
    # the kernel refuses this fillet: 2 mm, written as the material it adds along each edge
    with BuildSketch(Plane(origin=(20.357070738, 0, 91.948589209), x_dir=(-0.22429460454884337, 0, 0.974521385281143), z_dir=(0, 1, 0))) as fillet4_piece_1:
        with BuildLine():
            CenterArc((1.551860901, 1.686696047), FILLET4_R, 237.495369906, 9.676681216)
            ThreePointArc((0.77593045, -0.156651976), (0.395792845, -0.039554126), (0, 0))
            Line((0, 0), (0.477125378, 0))
        make_face()
    extrude(amount=3.175)
    # the kernel refuses this fillet: 2 mm, written as the material it adds along each edge
    with BuildSketch(Plane(origin=(20.25005409, 3.175, 92.413558093), x_dir=(1, 0, 0), z_dir=(0, -1, 0))) as fillet4_2_piece_1:
        with BuildLine():
            CenterArc((0.898626945, 2), FILLET4_R, 226.75155148, 43.24844852)
            Line((-0.471699589, 0.543220953), (-0.608732242, 0.397543049))
            ThreePointArc((-0.608732242, 0.397543049), (-0.381915572, 0.139094357), (-0.140266399, -0.142566957))
            Line((-0.140266399, -0.142566957), (0, -0.2))
            Line((0, -0.2), (0.898626945, -0.2))
            Line((0.898626945, -0.2), (0.898626945, 0))
        make_face()
    extrude(amount=3.175)

    # Sketch4 → Boss-Extrude3 (add)
    with BuildSketch(Plane(origin=(0, 3.175, 0), x_dir=(1, 0, 0), z_dir=(0, 1, 0)).offset(BOSS_EXTRUDE3_START)):
        with BuildLine():
            Line((13.146507893, -2.714804316), (7.259795863, 5.319338683))
            ThreePointArc((7.259795863, 5.319338683), (0, 9), (-7.259795863, 5.319338683))
            Line((-7.259795863, 5.319338683), (-13.146507893, -2.714804316))
            Line((-13.146507893, -2.714804316), (-20, 2.306830778))
            Line((-20, 2.306830778), (-20, 25))
            Line((-20, 25), (20, 25))
            Line((20, 25), (20, 2.306830778))
            Line((20, 2.306830778), (13.146507893, -2.714804316))
        make_face()
        with Locations(Location((-15, 20, 0), (0, 0, 270))):
            Circle(SKETCH4_R, mode=Mode.SUBTRACT)
        with Locations(Location((15, 20, 0), (0, 0, 270))):
            Circle(SKETCH4_R, mode=Mode.SUBTRACT)
    extrude(amount=BOSS_EXTRUDE3_DEPTH)

    # Fillet5
    fillet5_edges = [part.edges().sort_by_distance(p)[0] for p in [
        (13.146507893, 1.5875, 2.714804316),
        (20, 1.5875, -2.306830778),
        (20, 1.5875, -25),
        (-20, 1.5875, -25),
        (-20, 1.5875, -2.306830778),
        (-13.146507893, 1.5875, 2.714804316),
    ]]
    fillet(fillet5_edges, radius=FILLET5_R)


solid = part.part
